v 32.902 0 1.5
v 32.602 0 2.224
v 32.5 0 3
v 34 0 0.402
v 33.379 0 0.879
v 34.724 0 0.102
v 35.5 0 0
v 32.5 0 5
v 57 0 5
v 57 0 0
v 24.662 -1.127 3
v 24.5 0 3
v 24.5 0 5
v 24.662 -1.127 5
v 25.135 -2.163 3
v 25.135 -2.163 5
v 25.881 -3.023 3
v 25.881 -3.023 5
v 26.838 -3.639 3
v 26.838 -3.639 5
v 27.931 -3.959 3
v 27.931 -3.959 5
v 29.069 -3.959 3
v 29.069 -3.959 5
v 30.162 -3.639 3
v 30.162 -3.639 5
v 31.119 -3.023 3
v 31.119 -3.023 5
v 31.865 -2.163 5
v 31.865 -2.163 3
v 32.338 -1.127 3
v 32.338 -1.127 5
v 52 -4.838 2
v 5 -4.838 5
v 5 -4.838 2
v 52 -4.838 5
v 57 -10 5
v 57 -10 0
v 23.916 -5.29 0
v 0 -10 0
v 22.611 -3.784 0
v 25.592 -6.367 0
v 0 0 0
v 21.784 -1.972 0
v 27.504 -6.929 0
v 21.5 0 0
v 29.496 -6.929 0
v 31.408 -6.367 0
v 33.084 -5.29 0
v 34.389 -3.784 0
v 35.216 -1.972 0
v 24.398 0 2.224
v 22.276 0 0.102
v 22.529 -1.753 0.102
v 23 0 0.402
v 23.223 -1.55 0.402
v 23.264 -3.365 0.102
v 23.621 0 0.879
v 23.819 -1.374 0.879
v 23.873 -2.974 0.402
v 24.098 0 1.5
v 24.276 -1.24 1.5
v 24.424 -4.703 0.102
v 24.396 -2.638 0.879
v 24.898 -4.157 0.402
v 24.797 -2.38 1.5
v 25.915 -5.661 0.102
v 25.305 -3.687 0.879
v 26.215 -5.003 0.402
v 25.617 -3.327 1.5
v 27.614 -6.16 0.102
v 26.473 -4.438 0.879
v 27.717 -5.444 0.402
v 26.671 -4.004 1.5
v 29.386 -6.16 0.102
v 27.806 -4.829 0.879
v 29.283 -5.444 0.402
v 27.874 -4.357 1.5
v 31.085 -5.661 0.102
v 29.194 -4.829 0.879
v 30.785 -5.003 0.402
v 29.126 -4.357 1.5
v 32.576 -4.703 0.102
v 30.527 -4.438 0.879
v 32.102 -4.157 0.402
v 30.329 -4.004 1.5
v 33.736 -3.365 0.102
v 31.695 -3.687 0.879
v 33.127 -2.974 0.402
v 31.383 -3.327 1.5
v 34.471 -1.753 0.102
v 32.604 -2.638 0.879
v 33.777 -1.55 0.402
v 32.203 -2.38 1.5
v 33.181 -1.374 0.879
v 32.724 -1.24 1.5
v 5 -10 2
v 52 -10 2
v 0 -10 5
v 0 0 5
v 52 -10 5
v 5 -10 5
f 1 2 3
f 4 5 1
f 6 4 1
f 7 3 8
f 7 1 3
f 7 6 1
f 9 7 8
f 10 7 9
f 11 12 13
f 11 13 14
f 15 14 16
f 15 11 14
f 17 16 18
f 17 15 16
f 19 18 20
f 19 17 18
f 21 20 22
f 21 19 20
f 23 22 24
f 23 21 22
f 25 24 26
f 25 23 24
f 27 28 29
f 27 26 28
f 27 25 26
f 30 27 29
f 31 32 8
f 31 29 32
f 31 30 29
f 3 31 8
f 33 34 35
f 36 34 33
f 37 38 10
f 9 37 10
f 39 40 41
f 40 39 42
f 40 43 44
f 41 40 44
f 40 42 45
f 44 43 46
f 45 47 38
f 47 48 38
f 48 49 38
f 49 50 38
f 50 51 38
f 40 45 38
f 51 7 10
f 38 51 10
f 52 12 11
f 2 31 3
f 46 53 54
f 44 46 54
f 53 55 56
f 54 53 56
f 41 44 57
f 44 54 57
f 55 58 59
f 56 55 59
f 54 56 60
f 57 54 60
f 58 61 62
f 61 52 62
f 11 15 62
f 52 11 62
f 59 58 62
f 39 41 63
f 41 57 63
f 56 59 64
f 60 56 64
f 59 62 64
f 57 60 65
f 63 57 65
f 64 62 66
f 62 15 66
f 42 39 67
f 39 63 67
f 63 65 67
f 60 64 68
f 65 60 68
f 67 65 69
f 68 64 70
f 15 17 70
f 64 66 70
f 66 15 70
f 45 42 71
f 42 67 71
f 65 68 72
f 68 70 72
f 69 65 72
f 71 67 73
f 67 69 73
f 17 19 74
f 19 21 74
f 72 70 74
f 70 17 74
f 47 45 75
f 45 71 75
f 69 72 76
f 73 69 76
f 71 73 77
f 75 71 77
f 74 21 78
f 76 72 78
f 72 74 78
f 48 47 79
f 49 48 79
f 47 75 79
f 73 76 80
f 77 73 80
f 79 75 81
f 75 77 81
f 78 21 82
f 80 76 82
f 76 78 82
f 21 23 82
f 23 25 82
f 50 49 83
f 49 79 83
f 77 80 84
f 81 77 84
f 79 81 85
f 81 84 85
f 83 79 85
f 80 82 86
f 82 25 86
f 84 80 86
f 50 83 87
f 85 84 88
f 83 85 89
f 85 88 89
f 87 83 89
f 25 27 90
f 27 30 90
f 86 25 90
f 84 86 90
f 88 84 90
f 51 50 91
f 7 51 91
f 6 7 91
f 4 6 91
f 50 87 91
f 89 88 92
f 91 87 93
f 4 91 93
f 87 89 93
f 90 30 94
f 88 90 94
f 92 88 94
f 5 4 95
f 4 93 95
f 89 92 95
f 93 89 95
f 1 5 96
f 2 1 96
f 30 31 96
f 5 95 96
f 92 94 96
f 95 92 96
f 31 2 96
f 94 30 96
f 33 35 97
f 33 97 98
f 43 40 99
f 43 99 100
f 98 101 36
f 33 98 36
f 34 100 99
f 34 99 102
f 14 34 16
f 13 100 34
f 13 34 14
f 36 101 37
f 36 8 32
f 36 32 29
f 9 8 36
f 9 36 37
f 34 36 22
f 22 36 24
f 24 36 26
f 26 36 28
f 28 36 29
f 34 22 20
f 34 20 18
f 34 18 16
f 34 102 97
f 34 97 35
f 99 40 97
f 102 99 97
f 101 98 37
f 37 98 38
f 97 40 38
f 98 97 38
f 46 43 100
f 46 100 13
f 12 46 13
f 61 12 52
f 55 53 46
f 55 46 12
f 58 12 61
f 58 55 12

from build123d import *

# Parameters (mm, degrees)
SKETCH1_W           = 57
SKETCH1_H           = 10
BOSS_EXTRUDE1_DEPTH = 5
SKETCH2_W           = 47
SKETCH2_H           = 5.162319645
CUT_EXTRUDE1_DEPTH  = 3
CUT_EXTRUDE2_DEPTH  = 6
FILLET1_R           = 3


with BuildPart() as part:
    # Sketch1 → Boss-Extrude1 (new body)
    with BuildSketch(Plane.XY):
        with Locations((28.5, -5)):
            Rectangle(SKETCH1_W, SKETCH1_H)
    extrude(amount=BOSS_EXTRUDE1_DEPTH)

    # Sketch2 → Cut-Extrude1 (cut)
    with BuildSketch(Plane.XY.offset(5)):
        with Locations((28.5, -7.418840177)):
            Rectangle(SKETCH2_W, SKETCH2_H)
    extrude(amount=-CUT_EXTRUDE1_DEPTH, mode=Mode.SUBTRACT)

    # Sketch3 → Cut-Extrude2 (cut, through all)
    with BuildSketch(Plane(origin=(0, 0, 0), x_dir=(-1, 0, 0), z_dir=(0, 0, -1))):
        with BuildLine():
            Line((-32.5, 0), (-24.5, 0))
            ThreePointArc((-24.5, 0), (-28.5, -4), (-32.5, 0))
        make_face()
    extrude(amount=-CUT_EXTRUDE2_DEPTH, mode=Mode.SUBTRACT)

    # Fillet1
    fillet1_edges = [part.edges().sort_by_distance(p)[0] for p in [
        (28.5, -4, 0),
    ]]
    fillet(fillet1_edges, radius=FILLET1_R)


solid = part.part
